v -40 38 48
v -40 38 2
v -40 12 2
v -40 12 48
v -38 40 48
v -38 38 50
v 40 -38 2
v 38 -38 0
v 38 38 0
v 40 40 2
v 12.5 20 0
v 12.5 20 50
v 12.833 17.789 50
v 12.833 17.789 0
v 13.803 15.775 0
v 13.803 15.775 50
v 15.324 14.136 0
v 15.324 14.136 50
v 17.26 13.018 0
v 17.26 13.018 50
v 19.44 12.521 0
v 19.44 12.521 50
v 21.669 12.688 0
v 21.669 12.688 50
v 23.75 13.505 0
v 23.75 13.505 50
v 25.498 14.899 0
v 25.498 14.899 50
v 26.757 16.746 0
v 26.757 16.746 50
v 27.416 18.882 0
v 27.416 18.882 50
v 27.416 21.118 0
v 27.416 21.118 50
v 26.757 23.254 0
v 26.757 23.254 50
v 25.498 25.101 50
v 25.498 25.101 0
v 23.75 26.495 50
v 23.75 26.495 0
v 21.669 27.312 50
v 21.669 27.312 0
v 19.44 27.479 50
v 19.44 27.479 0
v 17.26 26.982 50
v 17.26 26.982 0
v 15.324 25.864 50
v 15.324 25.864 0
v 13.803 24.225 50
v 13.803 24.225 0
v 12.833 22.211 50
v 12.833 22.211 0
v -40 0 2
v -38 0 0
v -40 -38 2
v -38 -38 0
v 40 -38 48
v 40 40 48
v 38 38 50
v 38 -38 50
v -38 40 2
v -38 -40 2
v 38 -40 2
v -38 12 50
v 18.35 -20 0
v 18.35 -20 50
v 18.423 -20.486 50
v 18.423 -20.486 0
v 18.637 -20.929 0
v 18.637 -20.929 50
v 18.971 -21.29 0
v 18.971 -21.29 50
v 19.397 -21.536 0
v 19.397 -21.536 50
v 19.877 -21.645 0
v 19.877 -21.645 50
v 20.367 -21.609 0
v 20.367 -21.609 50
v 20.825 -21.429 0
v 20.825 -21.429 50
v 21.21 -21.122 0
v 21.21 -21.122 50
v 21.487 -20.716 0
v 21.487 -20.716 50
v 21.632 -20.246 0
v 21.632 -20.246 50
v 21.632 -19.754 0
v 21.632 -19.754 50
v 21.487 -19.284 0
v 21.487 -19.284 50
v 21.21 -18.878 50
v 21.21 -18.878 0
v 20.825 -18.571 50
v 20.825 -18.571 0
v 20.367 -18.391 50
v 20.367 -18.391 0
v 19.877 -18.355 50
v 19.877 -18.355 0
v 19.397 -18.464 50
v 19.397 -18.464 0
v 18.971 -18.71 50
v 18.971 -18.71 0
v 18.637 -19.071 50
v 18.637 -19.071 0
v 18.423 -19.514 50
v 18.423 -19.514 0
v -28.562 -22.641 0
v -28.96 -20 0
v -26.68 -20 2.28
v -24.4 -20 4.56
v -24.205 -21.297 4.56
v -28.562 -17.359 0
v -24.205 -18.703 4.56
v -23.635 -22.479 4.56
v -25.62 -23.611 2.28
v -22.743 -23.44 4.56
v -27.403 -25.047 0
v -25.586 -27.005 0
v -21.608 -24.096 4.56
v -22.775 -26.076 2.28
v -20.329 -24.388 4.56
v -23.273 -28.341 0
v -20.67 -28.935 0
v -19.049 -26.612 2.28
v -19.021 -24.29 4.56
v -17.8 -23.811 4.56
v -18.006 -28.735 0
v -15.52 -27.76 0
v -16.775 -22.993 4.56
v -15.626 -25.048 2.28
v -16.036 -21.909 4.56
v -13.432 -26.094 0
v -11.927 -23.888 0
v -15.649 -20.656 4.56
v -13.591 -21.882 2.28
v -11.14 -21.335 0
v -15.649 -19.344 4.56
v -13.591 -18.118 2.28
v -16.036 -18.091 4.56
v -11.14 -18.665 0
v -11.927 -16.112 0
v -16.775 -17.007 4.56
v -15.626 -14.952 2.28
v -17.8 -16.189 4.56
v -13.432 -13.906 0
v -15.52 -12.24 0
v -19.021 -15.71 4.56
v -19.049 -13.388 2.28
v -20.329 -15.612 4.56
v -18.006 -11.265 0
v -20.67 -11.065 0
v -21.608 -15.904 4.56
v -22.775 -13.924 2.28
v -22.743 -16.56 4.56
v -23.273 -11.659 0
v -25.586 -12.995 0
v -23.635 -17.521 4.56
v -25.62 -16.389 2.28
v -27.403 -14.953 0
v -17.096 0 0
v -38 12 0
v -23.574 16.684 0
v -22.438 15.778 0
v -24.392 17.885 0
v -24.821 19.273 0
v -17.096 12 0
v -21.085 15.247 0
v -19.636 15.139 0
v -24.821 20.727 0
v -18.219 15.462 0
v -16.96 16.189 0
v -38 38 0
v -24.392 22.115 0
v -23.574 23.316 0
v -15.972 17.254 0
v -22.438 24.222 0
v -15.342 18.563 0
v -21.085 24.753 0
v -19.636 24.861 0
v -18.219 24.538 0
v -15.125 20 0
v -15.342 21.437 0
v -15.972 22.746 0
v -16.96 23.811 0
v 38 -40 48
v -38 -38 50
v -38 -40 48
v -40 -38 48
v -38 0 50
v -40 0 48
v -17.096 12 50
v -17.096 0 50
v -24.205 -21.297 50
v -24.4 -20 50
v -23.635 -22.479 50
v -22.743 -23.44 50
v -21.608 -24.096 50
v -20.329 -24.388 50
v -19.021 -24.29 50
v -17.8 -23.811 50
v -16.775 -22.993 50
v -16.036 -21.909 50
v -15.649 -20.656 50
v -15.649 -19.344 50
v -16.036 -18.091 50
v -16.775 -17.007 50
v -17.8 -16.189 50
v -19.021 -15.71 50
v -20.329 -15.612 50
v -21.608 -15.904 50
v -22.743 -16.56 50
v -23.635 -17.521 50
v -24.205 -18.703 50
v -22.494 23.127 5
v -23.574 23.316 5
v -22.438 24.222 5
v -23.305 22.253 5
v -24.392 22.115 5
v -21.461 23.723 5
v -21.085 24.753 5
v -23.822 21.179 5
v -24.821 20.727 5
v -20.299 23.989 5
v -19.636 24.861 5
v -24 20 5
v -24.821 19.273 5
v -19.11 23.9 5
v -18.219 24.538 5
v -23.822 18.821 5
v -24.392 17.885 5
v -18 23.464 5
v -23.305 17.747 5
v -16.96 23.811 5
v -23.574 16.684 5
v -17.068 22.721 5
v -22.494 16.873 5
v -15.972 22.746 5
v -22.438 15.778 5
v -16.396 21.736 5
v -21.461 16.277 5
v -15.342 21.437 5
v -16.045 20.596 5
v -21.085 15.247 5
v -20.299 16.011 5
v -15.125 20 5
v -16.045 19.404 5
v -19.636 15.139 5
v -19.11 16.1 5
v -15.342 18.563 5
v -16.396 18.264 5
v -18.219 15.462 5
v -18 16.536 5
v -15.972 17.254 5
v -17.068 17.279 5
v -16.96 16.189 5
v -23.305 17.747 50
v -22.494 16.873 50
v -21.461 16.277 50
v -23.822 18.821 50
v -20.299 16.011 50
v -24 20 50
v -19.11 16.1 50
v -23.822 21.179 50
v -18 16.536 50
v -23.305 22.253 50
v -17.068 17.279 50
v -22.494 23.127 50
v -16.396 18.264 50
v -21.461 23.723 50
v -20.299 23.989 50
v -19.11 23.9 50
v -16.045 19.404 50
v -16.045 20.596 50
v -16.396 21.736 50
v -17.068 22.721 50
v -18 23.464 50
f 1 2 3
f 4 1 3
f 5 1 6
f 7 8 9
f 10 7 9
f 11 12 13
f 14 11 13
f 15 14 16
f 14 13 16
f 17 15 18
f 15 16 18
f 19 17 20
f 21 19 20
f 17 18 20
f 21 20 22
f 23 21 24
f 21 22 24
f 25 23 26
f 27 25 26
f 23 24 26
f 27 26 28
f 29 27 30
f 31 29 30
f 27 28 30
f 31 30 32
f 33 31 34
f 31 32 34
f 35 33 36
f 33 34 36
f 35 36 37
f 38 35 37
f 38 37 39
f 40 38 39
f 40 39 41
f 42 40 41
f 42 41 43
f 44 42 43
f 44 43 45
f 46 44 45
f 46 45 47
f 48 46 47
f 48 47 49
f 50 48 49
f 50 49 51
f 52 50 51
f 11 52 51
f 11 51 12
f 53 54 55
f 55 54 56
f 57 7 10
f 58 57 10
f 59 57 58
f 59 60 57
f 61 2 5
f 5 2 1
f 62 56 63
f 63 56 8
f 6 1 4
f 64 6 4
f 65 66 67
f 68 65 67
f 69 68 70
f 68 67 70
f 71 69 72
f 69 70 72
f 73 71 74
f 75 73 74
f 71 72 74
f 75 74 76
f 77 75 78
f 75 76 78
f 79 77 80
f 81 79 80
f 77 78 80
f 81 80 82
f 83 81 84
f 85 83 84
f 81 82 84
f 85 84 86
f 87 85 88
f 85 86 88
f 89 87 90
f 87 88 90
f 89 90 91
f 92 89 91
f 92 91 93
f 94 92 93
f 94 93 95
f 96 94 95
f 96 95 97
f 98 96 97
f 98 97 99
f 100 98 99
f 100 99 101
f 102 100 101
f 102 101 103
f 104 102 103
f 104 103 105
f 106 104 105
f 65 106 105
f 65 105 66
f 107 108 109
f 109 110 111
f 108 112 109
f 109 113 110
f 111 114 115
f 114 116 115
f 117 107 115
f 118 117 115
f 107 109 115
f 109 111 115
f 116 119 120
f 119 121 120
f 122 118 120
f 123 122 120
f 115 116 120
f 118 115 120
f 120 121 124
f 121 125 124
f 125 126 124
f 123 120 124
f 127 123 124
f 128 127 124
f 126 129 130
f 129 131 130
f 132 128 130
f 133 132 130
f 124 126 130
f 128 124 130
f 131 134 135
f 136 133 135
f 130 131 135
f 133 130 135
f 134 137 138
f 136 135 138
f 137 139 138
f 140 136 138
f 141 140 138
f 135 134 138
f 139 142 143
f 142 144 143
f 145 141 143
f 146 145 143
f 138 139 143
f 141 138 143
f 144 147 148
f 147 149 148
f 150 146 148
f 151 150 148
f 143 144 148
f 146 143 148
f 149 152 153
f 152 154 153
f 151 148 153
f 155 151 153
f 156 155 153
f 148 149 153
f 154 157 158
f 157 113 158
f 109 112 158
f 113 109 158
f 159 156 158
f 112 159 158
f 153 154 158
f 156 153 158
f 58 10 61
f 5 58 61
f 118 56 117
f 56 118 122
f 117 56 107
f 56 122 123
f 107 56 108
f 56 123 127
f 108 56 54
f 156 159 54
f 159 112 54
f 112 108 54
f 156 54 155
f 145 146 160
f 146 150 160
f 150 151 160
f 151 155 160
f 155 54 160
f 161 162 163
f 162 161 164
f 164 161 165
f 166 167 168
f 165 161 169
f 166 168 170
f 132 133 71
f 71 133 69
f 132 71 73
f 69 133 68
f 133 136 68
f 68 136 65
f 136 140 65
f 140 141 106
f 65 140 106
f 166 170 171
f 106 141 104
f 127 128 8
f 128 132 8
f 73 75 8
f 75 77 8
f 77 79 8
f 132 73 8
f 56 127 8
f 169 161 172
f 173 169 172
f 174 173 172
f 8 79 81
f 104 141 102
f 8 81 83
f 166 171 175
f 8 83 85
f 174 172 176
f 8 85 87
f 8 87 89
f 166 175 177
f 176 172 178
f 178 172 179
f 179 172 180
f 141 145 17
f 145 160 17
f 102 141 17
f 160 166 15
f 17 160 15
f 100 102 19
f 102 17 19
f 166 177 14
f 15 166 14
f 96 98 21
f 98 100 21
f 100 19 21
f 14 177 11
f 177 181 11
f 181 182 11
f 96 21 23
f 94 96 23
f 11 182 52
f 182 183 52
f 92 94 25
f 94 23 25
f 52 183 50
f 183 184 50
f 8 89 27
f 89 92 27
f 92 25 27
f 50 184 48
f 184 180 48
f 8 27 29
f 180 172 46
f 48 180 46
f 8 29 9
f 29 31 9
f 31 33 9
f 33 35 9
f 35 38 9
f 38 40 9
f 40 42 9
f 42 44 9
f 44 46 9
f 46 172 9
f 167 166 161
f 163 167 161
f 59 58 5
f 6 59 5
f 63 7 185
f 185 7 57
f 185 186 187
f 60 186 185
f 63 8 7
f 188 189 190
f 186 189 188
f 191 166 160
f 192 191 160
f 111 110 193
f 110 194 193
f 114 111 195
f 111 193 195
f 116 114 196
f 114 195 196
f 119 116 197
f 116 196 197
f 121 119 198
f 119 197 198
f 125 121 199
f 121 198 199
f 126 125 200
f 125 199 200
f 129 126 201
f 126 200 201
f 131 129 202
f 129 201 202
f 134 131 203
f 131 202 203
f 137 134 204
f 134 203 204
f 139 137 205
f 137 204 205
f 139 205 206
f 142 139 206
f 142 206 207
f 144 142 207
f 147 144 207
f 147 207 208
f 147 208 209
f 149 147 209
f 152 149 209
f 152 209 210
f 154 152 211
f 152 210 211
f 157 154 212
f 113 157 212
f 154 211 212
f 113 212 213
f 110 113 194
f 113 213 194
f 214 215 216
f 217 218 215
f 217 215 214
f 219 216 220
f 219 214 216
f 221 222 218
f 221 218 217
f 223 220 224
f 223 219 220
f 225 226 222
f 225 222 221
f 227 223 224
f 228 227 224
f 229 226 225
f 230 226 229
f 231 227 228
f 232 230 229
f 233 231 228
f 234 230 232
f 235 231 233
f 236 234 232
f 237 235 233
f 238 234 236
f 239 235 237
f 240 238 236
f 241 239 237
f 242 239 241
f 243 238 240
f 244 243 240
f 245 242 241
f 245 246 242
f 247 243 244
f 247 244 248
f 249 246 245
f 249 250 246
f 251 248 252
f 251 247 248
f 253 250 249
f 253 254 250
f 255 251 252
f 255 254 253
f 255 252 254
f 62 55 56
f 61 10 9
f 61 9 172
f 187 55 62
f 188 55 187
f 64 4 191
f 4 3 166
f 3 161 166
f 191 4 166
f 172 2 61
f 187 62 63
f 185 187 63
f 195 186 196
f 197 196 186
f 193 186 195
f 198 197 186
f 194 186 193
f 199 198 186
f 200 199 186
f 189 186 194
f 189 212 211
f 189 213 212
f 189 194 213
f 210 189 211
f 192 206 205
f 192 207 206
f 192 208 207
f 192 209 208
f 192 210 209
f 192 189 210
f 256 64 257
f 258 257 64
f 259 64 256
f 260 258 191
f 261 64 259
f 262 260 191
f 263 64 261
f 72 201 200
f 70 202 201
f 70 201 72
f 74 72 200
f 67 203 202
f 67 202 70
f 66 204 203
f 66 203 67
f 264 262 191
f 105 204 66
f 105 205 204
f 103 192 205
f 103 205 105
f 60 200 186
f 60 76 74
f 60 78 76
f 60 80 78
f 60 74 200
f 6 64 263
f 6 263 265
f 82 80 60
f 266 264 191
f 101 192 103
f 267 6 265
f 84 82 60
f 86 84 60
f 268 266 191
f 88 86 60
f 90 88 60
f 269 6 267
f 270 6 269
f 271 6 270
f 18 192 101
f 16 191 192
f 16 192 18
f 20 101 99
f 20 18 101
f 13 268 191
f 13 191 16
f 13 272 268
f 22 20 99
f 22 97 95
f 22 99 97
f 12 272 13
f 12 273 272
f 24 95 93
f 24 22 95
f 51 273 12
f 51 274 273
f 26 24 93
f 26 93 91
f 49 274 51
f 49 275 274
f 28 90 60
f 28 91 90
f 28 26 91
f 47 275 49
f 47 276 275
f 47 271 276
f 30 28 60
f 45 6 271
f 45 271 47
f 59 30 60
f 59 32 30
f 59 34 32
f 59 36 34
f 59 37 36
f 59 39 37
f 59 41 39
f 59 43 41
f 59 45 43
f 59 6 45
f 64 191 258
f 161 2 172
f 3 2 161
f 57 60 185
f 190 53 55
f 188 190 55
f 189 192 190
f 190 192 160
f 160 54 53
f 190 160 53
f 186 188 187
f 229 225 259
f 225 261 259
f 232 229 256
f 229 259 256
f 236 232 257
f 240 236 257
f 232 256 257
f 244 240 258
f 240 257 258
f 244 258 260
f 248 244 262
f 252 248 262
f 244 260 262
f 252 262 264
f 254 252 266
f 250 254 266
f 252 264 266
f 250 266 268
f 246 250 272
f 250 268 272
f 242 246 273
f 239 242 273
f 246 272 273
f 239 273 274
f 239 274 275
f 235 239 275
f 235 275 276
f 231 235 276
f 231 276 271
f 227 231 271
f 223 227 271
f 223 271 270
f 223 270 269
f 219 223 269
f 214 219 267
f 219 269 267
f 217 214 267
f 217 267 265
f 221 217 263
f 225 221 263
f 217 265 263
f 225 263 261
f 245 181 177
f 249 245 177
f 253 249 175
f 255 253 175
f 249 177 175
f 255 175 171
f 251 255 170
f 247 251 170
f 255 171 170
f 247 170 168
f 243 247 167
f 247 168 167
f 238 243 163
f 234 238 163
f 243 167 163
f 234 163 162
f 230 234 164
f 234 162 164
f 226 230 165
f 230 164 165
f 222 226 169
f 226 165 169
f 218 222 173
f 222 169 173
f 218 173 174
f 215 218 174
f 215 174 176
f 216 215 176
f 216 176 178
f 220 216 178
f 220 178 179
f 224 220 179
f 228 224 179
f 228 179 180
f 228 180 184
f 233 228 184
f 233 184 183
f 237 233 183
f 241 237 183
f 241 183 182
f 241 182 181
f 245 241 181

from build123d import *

# Parameters (mm, degrees)
F1_DEPTH       = 50
F2_D           = 8
F2_CBORE_D     = 9.75
F2_CBORE_DEPTH = 5
F3_D           = 15
F4_D           = 8.8
F4_CSINK_D     = 17.92
F4_CSINK_ANGLE = 90
F5_D           = 3.3
F6_SIZE2       = 2
F6_SIZE        = 2


with BuildPart() as f1:
    # F0 (on Top) → F1 (new body)
    with BuildSketch(Plane.XY):
        Polygon((-40, -40), (40, -40), (40, 40), (-40, 40), (-40, 12), (-17.0964375138, 12), (-17.0964375138, 0), (-40, 0), align=None)
    extrude(amount=F1_DEPTH)

    # F2 (through all)
    with Locations(Plane(origin=(0, 0, 0), x_dir=(1, 0, 0), z_dir=(0, 0, -1))):
        with Locations((-20, -20)):
            CounterBoreHole(F2_D / 2, F2_CBORE_D / 2, F2_CBORE_DEPTH)

    # F3 (through all)
    with Locations(Plane(origin=(0, 0, 0), x_dir=(1, 0, 0), z_dir=(0, 0, -1))):
        with Locations((20, -20)):
            Hole(F3_D / 2)

    # F4 (through all)
    with Locations(Plane(origin=(0, 0, 0), x_dir=(1, 0, 0), z_dir=(0, 0, -1))):
        with Locations((-20, 20)):
            CounterSinkHole(F4_D / 2, F4_CSINK_D / 2, counter_sink_angle=F4_CSINK_ANGLE)

    # F5 (through all)
    with Locations(Plane(origin=(0, 0, 0), x_dir=(1, 0, 0), z_dir=(0, 0, -1))):
        with Locations((20, 20)):
            Hole(F5_D / 2)

    # F6
    f6_edges = [f1.edges().sort_by_distance(p)[0] for p in [
        (-40, 40, 25),
        (-40, -20, 50),
        (-40, 26, 50),
        (-40, -40, 25),
        (-40, -20, 0),
        (-40, 26, 0),
        (0, 40, 0),
        (0, -40, 0),
        (40, 0, 0),
        (40, 0, 50),
        (0, 40, 50),
        (0, -40, 50),
        (40, -40, 25),
    ]]
    chamfer(f6_edges, length=F6_SIZE, length2=F6_SIZE2)


solid = f1.part
